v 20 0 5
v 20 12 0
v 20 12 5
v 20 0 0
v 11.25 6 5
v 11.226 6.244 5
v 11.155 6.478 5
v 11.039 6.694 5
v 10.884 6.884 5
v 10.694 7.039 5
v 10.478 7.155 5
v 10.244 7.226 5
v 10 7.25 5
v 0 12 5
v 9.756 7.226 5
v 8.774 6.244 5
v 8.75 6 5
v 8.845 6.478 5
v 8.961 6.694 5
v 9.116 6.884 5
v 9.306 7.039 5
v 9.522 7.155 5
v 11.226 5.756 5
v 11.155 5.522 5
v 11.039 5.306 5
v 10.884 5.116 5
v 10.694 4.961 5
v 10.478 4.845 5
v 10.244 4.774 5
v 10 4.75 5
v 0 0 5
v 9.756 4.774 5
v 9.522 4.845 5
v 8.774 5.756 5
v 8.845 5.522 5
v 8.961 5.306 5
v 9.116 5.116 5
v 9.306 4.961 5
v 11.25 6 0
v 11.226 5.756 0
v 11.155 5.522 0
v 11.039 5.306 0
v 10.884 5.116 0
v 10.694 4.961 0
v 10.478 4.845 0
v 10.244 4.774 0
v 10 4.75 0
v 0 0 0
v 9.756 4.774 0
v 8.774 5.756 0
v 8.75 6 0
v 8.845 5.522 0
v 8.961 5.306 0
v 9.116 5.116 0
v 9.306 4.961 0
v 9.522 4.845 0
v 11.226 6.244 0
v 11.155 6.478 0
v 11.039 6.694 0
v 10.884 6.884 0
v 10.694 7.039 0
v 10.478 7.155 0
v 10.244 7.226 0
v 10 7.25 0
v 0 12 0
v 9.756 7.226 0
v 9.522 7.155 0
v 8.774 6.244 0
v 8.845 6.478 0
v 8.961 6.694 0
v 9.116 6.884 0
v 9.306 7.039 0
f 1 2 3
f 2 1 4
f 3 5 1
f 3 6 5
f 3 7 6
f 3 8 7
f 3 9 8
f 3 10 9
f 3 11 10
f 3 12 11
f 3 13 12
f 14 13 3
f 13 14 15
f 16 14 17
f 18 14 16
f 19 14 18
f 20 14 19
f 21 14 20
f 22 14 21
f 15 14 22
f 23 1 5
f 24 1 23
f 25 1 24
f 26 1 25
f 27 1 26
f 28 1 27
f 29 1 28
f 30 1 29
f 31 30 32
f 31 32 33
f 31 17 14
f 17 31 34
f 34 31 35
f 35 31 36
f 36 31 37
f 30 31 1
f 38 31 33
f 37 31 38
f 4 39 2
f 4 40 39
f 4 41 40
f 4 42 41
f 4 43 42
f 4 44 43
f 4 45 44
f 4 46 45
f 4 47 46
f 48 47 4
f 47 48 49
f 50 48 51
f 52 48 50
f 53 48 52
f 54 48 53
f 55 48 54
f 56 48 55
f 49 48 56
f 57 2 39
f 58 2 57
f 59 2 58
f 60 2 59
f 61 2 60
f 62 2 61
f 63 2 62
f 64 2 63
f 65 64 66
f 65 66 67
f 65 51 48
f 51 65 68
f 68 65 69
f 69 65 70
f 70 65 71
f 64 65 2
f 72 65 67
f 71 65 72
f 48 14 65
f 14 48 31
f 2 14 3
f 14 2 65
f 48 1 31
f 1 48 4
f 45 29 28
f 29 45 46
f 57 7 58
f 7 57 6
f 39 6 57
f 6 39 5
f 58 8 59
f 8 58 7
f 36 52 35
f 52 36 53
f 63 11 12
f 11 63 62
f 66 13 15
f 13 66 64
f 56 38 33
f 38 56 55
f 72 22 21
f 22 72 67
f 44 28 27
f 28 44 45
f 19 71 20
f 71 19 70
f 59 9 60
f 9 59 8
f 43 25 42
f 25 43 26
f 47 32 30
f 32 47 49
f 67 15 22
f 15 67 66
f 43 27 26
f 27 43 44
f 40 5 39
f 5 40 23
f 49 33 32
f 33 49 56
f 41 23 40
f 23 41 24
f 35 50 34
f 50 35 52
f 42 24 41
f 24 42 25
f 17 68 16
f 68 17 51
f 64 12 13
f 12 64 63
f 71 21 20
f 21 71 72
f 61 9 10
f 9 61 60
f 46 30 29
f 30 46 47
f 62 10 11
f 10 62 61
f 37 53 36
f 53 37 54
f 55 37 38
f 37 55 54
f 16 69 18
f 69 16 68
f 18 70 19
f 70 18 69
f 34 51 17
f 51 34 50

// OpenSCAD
$fn = 32;

// ----------------------------------------------------------------------
// Micro pad: drilled pad, 5-20 mm class
// ----------------------------------------------------------------------

// --- parameters (mm) ---
pad_l = 20;               // pad length, X
pad_w = 12;               // pad width, Y
pad_t = 5;                // pad thickness, Z
hole_d = 2.5;             // through hole diameter

difference() {
  cube([pad_l, pad_w, pad_t]);
  translate([pad_l / 2, pad_w / 2, -1])
    cylinder(h = pad_t + 2, d = hole_d);
}
